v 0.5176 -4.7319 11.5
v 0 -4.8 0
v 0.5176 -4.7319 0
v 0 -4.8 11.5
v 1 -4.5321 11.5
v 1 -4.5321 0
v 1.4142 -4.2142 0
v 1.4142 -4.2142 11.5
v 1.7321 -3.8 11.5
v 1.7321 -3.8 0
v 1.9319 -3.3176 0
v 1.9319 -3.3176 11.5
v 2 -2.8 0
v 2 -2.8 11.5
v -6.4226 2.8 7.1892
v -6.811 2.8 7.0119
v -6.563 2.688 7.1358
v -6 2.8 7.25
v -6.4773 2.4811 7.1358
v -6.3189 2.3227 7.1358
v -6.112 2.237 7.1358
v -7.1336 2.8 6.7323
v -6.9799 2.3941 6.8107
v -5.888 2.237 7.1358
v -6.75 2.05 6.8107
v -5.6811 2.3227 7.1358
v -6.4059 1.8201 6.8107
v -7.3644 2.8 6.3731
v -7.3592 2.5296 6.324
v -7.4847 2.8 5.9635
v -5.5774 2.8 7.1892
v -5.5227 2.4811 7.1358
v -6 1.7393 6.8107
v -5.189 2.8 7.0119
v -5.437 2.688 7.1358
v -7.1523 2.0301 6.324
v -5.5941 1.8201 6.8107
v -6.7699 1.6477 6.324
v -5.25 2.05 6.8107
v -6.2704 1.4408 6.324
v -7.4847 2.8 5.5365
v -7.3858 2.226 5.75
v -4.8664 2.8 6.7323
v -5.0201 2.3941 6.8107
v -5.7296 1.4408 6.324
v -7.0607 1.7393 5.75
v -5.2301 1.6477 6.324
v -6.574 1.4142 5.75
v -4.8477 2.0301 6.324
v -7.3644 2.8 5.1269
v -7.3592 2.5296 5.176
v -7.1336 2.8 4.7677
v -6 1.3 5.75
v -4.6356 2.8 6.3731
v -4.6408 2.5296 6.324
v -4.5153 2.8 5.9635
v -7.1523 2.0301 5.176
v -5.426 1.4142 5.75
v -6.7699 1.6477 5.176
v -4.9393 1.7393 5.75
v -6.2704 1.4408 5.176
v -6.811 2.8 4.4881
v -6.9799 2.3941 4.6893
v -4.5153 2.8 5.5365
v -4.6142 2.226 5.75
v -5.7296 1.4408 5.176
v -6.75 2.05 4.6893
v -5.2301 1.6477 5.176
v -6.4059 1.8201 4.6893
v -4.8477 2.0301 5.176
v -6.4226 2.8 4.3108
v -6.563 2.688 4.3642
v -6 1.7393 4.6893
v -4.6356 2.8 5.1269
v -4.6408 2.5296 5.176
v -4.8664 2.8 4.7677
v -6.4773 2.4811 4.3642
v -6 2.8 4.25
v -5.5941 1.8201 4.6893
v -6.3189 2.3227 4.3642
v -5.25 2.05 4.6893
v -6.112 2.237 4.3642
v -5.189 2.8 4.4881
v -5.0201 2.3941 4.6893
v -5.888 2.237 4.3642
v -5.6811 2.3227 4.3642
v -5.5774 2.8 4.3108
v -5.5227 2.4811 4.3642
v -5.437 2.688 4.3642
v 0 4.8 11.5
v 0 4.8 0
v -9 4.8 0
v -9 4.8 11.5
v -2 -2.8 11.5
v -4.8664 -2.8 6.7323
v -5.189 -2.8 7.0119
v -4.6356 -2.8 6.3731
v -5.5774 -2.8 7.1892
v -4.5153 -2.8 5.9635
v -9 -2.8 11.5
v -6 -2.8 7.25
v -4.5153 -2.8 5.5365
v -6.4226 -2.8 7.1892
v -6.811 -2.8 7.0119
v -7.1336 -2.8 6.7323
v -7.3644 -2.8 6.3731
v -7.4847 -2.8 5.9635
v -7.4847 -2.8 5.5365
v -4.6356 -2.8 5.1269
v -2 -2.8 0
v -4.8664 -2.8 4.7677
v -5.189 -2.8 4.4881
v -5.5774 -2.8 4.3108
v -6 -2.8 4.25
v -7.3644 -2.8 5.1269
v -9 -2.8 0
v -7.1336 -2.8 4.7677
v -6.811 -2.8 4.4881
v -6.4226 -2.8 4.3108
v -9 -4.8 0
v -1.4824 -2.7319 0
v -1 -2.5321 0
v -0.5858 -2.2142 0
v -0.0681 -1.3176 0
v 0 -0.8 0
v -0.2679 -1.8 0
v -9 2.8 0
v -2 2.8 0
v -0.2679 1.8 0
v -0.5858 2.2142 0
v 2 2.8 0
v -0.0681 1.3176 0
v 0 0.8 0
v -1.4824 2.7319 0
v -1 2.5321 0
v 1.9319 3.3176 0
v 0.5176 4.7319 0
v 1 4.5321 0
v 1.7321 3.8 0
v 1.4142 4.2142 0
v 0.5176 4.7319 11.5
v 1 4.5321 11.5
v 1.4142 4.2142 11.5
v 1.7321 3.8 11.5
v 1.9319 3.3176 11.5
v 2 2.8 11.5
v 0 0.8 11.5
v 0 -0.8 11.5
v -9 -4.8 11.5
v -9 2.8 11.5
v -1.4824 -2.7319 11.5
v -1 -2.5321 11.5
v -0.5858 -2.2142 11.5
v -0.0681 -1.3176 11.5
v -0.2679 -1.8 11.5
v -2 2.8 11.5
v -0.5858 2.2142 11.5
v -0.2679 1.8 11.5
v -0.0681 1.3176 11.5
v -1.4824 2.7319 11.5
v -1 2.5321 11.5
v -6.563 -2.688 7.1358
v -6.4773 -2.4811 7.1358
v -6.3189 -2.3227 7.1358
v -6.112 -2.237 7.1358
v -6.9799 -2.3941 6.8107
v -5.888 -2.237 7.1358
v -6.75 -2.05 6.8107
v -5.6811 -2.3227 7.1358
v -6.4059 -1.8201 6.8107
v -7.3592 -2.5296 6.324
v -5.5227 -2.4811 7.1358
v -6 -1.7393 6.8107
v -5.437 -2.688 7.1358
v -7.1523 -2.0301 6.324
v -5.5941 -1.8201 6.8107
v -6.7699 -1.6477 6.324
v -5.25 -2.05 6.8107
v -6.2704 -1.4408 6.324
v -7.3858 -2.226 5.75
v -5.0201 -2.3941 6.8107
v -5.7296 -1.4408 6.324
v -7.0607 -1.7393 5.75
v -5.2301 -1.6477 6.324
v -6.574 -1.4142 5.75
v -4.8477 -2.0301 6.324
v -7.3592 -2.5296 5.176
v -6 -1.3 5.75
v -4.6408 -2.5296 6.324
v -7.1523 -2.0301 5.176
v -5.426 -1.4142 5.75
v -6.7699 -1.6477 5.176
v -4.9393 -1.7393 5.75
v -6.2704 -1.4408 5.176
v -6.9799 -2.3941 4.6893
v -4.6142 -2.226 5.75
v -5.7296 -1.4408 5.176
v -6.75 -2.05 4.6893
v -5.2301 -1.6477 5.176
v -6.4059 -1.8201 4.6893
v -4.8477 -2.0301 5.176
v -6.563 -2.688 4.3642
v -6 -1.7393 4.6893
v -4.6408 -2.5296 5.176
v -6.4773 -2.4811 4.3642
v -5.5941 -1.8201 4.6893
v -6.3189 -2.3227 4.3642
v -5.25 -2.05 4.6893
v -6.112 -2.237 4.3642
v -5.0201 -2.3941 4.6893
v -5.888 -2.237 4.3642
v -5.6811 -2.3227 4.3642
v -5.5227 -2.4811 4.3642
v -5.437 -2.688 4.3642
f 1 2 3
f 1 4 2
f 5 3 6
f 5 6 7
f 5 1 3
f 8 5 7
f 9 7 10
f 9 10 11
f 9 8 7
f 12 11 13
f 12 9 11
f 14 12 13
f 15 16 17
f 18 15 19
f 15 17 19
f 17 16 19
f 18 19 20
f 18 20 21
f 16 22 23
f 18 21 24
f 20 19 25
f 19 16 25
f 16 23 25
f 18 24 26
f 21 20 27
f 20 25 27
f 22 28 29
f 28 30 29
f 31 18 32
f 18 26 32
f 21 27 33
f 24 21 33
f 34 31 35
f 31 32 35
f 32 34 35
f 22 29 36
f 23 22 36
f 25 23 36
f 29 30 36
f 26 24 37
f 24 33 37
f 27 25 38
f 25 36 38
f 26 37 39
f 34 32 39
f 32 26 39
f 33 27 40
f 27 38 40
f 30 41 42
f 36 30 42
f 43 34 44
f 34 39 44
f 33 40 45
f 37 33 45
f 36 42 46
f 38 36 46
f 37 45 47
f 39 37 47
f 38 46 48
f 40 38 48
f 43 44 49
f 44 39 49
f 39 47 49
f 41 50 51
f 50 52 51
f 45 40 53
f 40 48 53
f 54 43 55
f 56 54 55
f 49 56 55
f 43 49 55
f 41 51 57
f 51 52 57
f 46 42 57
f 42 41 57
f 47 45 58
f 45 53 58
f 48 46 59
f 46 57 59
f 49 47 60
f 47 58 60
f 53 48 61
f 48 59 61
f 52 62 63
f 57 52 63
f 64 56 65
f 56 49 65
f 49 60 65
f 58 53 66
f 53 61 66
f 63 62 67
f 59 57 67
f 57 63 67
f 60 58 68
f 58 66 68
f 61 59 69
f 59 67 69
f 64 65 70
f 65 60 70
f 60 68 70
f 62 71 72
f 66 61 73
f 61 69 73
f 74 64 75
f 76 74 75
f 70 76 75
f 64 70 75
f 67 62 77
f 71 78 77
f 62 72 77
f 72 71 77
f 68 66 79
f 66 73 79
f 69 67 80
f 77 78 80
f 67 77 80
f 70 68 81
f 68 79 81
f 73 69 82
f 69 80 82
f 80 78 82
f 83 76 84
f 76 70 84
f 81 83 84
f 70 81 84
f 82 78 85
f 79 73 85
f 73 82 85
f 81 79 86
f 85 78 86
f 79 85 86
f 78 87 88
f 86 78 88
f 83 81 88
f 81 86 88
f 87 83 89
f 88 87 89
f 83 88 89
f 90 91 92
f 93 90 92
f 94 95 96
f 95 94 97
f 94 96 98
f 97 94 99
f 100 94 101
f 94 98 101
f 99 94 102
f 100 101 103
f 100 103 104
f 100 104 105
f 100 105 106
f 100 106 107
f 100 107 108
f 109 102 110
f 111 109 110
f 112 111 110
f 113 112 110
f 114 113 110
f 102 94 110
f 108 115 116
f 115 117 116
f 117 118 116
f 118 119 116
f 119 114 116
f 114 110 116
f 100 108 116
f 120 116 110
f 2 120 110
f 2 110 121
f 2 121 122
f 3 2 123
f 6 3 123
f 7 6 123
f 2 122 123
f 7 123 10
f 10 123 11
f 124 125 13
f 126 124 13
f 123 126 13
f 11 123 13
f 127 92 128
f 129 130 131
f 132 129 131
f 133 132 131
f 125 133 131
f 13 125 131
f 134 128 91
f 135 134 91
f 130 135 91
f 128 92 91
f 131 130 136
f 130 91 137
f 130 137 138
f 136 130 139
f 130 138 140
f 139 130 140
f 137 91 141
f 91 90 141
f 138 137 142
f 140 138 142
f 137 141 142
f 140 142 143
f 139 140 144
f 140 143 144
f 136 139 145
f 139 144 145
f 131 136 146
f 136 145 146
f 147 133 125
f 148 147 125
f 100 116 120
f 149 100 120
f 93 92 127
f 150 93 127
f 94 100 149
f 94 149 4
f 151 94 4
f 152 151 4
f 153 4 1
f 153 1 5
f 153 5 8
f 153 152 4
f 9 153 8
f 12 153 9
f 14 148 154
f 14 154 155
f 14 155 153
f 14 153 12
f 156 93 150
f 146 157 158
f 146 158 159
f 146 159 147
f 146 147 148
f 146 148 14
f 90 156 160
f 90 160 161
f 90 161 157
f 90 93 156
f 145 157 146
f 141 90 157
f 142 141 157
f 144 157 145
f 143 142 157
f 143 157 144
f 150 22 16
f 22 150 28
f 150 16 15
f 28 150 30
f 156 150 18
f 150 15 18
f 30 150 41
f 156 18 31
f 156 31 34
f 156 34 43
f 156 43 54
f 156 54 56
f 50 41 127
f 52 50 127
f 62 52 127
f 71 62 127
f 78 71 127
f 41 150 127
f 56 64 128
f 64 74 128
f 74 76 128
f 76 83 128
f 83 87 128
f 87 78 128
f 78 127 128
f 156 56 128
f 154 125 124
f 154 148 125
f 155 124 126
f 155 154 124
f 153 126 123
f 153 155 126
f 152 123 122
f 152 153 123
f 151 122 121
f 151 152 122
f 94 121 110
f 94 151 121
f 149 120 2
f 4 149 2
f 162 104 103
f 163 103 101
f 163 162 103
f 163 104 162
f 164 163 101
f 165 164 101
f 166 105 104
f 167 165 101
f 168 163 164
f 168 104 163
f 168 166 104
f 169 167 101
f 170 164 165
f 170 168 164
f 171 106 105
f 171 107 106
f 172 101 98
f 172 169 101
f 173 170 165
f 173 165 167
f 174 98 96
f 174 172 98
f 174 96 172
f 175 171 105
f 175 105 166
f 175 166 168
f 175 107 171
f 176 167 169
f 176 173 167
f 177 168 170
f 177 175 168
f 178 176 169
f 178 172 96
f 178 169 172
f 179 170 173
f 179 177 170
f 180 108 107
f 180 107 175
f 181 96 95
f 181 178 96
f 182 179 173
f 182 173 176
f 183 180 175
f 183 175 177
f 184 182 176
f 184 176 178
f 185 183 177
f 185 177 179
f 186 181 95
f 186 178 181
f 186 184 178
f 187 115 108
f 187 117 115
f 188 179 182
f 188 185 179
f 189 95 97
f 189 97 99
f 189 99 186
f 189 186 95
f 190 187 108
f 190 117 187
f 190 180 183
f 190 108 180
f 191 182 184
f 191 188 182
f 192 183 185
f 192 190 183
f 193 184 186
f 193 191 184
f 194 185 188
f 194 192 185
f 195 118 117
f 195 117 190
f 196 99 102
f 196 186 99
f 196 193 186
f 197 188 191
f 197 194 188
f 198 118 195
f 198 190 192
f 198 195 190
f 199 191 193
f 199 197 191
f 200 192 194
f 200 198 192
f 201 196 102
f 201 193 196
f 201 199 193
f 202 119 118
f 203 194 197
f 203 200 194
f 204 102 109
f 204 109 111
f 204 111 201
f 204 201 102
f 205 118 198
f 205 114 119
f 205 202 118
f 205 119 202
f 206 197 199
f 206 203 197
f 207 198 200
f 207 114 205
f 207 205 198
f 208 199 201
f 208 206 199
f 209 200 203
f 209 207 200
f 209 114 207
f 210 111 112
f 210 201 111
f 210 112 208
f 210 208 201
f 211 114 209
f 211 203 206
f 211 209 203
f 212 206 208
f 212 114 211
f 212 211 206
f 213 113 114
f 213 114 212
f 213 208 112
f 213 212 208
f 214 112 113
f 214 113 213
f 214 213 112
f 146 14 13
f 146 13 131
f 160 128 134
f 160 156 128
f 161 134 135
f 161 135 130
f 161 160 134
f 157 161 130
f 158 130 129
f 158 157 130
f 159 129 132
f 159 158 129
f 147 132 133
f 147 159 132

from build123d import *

# Parameters (mm, degrees)
BOSS_EXTRUDE1_DEPTH = 11.5
REVOLVE1_ANGLE      = 180
FILLET1_R           = 2


with BuildPart() as part:
    # Sketch1 → Boss-Extrude1 (new body)
    with BuildSketch(Plane.XY):
        Polygon((-9, 2.8), (0, 2.8), (0, -2.8), (-9, -2.8), (-9, -4.8), (2, -4.8), (2, 4.8), (-9, 4.8), align=None)
    extrude(amount=BOSS_EXTRUDE1_DEPTH)

    # Sketch2 → Revolve1 (revolve)
    with BuildSketch(Plane.XZ.offset(-2.8)):
        with BuildLine():
            Line((-6, 4.25), (-6, 7.25))
            ThreePointArc((-6, 7.25), (-7.5, 5.75), (-6, 4.25))
        make_face()
    revolve1 = revolve(axis=Axis((-6, 2.8, 4.25), (0, 0, 1)), revolution_arc=REVOLVE1_ANGLE)

    # Mirror1: Revolve1 across plane
    add(revolve1.mirror(Plane.ZX))

    # Fillet1
    fillet1_edges = [part.edges().sort_by_distance(p)[0] for p in [
        (2, 4.8, 5.75),
        (2, -4.8, 5.75),
        (0, -2.8, 5.75),
        (0, 2.8, 5.75),
    ]]
    fillet(fillet1_edges, radius=FILLET1_R)


solid = part.part
